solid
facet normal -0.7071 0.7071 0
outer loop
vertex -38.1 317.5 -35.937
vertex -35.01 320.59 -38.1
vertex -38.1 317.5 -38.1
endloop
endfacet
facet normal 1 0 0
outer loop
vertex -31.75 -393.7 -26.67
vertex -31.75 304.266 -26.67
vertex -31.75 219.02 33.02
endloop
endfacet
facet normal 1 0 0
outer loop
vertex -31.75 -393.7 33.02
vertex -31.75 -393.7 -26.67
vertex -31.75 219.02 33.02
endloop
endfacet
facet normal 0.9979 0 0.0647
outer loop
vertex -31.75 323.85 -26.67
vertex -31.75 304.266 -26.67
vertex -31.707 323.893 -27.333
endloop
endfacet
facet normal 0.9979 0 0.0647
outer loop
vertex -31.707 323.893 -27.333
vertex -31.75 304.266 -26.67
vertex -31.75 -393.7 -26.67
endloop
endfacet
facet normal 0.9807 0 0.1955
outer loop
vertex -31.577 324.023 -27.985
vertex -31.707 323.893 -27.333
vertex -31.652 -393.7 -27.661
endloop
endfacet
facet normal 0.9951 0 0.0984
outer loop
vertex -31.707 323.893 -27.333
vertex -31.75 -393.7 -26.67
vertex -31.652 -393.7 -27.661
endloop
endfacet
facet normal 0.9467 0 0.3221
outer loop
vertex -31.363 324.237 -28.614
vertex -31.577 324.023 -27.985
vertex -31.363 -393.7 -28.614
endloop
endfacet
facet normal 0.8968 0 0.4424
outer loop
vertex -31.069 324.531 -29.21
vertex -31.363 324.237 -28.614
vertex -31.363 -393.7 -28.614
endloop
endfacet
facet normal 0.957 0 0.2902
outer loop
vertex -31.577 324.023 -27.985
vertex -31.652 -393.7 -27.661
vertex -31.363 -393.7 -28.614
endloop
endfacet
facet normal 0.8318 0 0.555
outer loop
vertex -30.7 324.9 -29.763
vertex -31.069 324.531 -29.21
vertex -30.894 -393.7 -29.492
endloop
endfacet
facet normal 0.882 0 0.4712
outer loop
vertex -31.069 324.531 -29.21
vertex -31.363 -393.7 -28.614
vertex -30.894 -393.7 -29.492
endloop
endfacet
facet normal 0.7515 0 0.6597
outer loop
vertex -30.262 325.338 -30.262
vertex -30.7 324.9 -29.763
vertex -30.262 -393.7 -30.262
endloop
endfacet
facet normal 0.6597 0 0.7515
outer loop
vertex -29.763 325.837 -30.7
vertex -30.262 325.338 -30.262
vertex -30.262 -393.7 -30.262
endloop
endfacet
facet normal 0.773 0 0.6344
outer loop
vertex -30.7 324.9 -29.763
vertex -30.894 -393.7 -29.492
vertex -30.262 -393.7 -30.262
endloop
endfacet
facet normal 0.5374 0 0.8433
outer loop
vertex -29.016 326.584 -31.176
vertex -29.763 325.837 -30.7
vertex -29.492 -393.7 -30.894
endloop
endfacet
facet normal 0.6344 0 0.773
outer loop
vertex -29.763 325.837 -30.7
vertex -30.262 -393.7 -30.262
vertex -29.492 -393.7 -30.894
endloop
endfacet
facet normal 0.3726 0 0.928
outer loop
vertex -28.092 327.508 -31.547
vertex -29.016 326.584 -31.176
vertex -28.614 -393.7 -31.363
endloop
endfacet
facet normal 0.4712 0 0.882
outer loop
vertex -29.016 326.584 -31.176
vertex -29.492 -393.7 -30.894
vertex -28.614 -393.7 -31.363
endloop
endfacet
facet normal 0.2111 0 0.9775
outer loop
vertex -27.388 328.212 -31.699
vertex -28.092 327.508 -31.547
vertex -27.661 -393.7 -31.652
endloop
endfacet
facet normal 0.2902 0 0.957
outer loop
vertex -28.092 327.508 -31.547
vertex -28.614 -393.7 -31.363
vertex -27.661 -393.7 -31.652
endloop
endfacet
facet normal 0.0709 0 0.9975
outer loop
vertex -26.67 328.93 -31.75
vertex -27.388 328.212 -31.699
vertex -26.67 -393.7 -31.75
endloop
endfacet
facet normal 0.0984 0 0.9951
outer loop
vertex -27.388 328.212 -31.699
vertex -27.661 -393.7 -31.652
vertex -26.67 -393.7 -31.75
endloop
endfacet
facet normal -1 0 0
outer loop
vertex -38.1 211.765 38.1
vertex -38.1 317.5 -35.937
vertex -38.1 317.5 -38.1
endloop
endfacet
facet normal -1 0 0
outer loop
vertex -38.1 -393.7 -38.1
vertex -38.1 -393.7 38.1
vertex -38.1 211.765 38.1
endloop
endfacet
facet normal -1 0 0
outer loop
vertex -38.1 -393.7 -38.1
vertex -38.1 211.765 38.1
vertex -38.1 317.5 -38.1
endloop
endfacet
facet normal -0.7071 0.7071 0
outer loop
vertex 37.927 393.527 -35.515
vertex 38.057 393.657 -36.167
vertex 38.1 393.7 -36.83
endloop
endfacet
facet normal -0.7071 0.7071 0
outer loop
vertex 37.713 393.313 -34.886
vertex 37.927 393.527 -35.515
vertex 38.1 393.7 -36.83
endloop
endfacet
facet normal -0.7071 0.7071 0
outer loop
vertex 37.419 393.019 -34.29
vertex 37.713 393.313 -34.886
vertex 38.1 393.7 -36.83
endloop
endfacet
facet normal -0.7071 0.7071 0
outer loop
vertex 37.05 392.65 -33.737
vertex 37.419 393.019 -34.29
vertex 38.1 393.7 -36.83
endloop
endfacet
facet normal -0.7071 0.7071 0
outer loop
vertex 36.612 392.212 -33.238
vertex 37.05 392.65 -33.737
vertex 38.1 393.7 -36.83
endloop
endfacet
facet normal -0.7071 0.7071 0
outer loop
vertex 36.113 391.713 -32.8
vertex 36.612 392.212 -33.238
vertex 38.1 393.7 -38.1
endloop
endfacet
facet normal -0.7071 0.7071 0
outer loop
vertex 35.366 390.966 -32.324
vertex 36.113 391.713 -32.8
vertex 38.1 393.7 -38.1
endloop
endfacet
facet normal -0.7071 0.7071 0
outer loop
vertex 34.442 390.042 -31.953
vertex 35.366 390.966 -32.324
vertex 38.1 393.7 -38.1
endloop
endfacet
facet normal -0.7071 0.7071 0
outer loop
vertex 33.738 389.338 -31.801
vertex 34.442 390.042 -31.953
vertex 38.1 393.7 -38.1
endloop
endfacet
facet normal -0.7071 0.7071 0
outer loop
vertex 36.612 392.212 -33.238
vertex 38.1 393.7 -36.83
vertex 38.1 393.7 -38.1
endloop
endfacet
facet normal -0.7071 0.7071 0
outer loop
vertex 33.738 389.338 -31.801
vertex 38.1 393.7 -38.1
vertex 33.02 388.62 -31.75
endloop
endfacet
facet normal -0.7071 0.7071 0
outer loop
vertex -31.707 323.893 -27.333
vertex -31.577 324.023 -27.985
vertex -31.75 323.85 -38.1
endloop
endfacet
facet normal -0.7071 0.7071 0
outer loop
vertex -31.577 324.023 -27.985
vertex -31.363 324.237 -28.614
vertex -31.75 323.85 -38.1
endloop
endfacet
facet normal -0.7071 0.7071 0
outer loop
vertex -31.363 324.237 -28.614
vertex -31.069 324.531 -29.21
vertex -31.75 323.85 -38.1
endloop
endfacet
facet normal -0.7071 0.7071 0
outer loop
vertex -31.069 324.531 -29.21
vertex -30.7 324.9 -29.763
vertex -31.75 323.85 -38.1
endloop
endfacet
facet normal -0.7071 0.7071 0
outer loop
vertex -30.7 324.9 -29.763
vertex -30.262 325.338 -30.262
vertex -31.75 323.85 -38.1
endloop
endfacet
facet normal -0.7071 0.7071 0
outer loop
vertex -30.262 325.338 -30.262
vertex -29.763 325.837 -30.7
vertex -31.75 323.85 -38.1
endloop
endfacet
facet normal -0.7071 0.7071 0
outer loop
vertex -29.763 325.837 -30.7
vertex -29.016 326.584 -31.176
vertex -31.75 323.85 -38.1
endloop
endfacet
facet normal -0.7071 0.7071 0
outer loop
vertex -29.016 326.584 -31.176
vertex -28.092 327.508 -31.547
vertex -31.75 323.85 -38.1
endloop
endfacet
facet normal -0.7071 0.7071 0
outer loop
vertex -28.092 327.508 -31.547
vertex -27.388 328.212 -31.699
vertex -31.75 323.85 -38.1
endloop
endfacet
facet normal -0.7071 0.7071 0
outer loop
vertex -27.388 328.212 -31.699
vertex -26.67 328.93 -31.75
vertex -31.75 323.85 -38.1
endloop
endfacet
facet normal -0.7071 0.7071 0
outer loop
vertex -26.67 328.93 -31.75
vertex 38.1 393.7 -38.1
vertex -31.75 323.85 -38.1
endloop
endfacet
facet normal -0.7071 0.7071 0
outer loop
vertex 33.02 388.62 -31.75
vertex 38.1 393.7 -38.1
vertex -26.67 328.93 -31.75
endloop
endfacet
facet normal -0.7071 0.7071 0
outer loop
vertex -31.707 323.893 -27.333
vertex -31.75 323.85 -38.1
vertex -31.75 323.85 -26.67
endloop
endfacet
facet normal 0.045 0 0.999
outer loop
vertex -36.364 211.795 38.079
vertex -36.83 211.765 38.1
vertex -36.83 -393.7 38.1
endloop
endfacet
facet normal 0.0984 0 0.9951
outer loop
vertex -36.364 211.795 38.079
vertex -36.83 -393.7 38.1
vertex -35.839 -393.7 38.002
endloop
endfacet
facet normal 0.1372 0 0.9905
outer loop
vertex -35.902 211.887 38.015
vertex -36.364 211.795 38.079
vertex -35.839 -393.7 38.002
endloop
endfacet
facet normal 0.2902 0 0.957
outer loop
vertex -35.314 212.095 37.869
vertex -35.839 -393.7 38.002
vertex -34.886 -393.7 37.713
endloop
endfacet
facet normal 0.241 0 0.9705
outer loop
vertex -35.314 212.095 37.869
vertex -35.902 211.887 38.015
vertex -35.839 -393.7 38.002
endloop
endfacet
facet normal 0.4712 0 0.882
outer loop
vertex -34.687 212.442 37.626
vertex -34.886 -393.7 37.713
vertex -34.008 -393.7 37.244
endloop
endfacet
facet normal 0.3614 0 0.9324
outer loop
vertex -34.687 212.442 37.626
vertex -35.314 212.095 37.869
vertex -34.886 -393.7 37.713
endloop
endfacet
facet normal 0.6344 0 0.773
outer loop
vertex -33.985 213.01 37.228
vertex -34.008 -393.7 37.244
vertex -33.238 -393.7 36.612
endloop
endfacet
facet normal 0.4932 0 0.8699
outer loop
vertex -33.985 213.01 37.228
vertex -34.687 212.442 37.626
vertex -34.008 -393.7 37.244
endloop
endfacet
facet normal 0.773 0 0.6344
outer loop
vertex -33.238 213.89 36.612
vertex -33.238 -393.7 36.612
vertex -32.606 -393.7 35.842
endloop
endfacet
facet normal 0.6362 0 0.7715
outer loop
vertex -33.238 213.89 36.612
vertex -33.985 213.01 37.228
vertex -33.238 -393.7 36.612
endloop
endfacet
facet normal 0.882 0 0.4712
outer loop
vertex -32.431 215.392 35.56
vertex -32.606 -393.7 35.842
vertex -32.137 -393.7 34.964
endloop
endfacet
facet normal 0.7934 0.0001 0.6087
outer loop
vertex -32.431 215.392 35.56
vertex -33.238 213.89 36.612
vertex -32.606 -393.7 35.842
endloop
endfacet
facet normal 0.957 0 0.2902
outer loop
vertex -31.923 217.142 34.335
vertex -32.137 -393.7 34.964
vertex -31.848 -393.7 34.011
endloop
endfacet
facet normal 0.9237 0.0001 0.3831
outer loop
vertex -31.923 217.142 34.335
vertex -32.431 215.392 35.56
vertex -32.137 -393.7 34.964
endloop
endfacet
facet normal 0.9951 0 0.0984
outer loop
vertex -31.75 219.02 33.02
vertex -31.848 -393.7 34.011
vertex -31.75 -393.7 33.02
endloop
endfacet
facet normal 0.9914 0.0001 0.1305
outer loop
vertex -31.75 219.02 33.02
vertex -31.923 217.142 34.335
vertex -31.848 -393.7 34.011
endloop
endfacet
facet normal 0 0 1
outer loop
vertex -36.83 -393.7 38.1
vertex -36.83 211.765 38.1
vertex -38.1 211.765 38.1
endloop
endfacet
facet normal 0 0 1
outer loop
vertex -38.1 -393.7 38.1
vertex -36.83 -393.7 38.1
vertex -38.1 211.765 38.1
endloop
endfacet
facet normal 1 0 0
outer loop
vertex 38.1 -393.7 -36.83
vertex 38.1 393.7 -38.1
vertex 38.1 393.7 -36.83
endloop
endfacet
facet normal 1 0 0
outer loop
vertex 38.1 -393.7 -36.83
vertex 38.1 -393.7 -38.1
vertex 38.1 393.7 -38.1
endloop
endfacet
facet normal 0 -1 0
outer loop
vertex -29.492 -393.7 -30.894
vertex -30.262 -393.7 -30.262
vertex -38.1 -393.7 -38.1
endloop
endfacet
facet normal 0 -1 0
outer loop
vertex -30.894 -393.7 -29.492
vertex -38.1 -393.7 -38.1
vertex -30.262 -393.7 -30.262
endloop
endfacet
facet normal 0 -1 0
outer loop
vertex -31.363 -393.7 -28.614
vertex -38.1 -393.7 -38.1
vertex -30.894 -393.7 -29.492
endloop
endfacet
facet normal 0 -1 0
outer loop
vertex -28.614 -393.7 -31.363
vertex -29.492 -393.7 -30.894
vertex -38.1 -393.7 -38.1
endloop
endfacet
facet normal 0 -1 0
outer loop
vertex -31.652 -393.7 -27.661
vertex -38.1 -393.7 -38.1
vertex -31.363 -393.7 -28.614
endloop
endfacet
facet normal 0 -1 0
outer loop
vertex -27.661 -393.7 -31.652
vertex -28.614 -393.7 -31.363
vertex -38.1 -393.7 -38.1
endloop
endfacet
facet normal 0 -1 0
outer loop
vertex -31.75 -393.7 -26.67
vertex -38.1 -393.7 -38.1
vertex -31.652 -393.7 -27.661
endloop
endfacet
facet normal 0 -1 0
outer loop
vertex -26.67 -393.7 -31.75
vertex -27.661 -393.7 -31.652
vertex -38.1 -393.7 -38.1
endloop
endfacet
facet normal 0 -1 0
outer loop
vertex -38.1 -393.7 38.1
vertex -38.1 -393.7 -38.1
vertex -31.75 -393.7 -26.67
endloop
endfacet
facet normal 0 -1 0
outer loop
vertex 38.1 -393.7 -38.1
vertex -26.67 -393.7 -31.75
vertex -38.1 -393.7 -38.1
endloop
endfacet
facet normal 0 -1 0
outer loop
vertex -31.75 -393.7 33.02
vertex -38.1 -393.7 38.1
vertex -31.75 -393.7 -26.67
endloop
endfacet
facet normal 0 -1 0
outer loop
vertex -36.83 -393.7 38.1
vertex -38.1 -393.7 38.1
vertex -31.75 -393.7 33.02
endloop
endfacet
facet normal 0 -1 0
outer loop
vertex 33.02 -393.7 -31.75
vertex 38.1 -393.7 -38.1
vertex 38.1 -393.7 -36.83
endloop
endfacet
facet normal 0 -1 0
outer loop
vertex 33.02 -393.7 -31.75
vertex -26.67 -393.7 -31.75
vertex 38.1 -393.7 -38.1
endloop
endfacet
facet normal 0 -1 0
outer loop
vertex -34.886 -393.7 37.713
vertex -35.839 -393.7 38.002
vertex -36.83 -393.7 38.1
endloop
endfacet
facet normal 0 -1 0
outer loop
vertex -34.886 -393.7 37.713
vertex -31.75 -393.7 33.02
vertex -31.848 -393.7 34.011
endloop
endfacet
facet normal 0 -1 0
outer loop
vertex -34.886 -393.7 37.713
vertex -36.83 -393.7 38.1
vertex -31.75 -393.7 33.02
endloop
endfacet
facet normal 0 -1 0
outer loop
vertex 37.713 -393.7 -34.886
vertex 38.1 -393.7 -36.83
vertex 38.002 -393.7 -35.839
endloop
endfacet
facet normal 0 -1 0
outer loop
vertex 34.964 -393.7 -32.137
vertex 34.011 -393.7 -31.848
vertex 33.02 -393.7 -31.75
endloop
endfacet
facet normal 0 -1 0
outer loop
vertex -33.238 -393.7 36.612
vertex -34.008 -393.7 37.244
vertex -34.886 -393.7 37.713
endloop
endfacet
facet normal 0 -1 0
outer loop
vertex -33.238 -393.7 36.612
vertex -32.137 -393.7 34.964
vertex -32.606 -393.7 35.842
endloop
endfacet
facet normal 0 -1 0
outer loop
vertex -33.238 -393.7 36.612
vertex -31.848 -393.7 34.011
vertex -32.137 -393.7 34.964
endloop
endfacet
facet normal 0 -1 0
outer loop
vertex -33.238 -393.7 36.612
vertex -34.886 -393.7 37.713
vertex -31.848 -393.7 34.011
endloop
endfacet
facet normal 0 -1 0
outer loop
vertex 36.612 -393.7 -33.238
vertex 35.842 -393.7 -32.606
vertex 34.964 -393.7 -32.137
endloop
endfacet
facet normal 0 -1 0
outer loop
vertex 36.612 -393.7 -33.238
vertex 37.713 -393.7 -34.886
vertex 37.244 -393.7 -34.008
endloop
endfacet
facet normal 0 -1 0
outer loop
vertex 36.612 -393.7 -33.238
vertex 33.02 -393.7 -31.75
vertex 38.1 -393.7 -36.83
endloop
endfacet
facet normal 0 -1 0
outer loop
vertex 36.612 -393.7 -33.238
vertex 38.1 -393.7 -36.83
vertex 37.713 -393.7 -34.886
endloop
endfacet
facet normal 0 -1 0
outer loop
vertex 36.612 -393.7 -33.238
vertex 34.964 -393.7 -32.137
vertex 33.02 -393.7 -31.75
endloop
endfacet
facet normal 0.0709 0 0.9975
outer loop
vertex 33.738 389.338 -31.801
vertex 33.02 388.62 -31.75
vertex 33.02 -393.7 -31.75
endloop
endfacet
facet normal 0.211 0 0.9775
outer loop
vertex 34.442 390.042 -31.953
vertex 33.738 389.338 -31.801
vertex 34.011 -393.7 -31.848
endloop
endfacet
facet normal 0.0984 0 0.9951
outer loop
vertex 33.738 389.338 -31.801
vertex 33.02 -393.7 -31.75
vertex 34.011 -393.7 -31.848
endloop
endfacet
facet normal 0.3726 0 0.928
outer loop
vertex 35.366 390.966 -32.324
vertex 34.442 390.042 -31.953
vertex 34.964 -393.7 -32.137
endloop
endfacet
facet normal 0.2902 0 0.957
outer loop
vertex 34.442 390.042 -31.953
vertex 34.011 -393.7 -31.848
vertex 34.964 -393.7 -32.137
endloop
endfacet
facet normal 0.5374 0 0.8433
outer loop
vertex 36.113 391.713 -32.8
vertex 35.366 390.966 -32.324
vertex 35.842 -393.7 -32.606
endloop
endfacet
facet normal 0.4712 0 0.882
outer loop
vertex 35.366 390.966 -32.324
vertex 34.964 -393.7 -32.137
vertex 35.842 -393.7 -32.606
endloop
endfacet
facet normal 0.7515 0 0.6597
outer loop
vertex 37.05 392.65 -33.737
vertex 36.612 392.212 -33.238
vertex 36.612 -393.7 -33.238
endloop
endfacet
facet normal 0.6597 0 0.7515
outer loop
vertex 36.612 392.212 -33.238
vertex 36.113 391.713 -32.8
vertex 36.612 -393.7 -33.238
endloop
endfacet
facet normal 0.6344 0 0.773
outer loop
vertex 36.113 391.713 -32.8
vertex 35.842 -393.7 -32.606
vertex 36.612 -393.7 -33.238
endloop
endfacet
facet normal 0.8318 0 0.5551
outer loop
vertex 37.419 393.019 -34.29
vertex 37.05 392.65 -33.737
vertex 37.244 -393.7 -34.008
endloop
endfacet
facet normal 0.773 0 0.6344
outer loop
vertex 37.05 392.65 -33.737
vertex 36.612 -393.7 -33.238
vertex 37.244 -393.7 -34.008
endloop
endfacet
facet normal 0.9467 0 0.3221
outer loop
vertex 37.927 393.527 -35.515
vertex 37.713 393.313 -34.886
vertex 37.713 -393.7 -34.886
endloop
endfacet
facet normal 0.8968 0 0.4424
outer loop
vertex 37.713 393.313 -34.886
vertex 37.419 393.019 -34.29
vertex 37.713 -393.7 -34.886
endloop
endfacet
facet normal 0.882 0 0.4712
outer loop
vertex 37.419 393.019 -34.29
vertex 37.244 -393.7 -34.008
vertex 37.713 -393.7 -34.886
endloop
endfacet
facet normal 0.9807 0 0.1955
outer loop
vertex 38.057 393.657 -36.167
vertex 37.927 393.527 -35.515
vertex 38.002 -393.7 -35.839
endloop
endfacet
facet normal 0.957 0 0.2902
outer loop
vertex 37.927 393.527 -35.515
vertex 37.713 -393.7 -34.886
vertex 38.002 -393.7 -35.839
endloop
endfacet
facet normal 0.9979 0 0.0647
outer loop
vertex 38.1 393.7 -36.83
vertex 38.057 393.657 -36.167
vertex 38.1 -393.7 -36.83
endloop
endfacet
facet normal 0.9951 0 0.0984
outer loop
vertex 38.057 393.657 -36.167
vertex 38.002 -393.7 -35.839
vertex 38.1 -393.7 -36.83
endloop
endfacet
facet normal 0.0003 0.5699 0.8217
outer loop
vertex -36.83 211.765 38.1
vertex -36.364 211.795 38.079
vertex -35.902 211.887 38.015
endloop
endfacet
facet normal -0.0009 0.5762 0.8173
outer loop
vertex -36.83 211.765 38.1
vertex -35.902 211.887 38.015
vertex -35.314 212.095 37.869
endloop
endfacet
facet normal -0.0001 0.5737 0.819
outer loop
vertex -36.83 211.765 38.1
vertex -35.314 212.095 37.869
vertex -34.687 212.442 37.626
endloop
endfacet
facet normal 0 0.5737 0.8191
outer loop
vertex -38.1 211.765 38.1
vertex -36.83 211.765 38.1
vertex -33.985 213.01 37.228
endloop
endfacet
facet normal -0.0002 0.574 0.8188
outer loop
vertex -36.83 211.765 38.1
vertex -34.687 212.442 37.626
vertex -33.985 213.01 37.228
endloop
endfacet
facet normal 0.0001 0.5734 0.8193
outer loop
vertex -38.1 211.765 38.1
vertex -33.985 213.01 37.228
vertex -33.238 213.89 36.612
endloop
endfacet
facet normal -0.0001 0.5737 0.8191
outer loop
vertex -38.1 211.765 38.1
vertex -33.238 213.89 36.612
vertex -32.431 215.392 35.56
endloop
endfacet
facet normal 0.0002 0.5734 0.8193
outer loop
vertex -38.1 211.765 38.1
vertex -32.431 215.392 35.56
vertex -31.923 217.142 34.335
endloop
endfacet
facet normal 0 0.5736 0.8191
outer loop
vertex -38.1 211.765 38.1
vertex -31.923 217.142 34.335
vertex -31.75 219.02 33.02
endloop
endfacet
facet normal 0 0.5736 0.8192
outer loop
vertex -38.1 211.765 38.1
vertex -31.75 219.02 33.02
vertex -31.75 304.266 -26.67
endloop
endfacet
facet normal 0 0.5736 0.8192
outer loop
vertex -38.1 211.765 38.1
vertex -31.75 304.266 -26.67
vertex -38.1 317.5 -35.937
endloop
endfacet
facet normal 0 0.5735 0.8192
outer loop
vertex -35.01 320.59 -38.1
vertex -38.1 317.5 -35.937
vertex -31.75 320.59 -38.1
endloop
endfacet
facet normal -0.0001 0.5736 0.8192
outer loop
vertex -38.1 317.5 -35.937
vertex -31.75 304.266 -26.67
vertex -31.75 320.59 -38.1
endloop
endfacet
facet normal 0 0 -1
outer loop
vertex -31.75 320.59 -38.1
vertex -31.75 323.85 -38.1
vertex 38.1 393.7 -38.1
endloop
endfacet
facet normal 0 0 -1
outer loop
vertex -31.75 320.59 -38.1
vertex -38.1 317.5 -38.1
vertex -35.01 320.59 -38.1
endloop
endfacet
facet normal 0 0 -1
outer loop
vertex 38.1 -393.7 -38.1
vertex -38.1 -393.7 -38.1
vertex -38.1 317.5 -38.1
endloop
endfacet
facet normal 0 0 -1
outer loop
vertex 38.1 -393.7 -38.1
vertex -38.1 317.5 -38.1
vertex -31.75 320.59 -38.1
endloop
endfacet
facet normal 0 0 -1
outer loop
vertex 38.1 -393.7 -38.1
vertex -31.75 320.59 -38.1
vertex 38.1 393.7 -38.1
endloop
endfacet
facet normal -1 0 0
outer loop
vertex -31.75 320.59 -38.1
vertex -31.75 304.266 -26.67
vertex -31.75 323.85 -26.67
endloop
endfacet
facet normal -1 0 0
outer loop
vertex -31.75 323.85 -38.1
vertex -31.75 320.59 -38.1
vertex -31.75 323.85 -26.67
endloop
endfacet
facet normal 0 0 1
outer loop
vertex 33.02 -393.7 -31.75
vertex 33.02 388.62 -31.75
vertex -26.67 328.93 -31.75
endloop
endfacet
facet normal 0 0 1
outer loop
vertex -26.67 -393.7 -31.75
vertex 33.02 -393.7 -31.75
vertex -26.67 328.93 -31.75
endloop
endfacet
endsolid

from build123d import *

# Parameters (mm, degrees)
F1_DEPTH = 393.7
F2_R     = 5.08
F4_DEPTH = 76.2
F6_DEPTH = 25.4


with BuildPart() as f1:
    # F0 (on Front) → F1 (new body, symmetric)
    with BuildSketch(Plane.XZ):
        Polygon((-38.1, -38.1), (38.1, -38.1), (38.1, -31.75), (-31.75, -31.75), (-31.75, 38.1), (-38.1, 38.1), align=None)
    extrude(amount=F1_DEPTH, both=True)

    # F2
    f2_edges = [f1.edges().sort_by_distance(p)[0] for p in [
        (-31.75, 0, 38.1),
        (-31.75, 0, -31.75),
        (38.1, 0, -31.75),
    ]]
    fillet(f2_edges, radius=F2_R)

    # F3 (on face) → F4 (cut)
    with BuildSketch(Plane(origin=(0, 0, -38.1), x_dir=(1, 0, 0), z_dir=(0, 0, -1))):
        Polygon((-38.1, -393.7), (38.1, -393.7), (-38.1, -317.5), align=None)
    extrude(amount=-F4_DEPTH, mode=Mode.SUBTRACT)

    # F5 (on face) → F6 (cut)
    with BuildSketch(Plane.YZ.offset(-31.75)):
        Polygon((200.3282578849, 46.1080149466), (323.85, -40.3828400151), (323.85, 46.1080149466), align=None)
    extrude(amount=-F6_DEPTH, mode=Mode.SUBTRACT)


solid = f1.part
